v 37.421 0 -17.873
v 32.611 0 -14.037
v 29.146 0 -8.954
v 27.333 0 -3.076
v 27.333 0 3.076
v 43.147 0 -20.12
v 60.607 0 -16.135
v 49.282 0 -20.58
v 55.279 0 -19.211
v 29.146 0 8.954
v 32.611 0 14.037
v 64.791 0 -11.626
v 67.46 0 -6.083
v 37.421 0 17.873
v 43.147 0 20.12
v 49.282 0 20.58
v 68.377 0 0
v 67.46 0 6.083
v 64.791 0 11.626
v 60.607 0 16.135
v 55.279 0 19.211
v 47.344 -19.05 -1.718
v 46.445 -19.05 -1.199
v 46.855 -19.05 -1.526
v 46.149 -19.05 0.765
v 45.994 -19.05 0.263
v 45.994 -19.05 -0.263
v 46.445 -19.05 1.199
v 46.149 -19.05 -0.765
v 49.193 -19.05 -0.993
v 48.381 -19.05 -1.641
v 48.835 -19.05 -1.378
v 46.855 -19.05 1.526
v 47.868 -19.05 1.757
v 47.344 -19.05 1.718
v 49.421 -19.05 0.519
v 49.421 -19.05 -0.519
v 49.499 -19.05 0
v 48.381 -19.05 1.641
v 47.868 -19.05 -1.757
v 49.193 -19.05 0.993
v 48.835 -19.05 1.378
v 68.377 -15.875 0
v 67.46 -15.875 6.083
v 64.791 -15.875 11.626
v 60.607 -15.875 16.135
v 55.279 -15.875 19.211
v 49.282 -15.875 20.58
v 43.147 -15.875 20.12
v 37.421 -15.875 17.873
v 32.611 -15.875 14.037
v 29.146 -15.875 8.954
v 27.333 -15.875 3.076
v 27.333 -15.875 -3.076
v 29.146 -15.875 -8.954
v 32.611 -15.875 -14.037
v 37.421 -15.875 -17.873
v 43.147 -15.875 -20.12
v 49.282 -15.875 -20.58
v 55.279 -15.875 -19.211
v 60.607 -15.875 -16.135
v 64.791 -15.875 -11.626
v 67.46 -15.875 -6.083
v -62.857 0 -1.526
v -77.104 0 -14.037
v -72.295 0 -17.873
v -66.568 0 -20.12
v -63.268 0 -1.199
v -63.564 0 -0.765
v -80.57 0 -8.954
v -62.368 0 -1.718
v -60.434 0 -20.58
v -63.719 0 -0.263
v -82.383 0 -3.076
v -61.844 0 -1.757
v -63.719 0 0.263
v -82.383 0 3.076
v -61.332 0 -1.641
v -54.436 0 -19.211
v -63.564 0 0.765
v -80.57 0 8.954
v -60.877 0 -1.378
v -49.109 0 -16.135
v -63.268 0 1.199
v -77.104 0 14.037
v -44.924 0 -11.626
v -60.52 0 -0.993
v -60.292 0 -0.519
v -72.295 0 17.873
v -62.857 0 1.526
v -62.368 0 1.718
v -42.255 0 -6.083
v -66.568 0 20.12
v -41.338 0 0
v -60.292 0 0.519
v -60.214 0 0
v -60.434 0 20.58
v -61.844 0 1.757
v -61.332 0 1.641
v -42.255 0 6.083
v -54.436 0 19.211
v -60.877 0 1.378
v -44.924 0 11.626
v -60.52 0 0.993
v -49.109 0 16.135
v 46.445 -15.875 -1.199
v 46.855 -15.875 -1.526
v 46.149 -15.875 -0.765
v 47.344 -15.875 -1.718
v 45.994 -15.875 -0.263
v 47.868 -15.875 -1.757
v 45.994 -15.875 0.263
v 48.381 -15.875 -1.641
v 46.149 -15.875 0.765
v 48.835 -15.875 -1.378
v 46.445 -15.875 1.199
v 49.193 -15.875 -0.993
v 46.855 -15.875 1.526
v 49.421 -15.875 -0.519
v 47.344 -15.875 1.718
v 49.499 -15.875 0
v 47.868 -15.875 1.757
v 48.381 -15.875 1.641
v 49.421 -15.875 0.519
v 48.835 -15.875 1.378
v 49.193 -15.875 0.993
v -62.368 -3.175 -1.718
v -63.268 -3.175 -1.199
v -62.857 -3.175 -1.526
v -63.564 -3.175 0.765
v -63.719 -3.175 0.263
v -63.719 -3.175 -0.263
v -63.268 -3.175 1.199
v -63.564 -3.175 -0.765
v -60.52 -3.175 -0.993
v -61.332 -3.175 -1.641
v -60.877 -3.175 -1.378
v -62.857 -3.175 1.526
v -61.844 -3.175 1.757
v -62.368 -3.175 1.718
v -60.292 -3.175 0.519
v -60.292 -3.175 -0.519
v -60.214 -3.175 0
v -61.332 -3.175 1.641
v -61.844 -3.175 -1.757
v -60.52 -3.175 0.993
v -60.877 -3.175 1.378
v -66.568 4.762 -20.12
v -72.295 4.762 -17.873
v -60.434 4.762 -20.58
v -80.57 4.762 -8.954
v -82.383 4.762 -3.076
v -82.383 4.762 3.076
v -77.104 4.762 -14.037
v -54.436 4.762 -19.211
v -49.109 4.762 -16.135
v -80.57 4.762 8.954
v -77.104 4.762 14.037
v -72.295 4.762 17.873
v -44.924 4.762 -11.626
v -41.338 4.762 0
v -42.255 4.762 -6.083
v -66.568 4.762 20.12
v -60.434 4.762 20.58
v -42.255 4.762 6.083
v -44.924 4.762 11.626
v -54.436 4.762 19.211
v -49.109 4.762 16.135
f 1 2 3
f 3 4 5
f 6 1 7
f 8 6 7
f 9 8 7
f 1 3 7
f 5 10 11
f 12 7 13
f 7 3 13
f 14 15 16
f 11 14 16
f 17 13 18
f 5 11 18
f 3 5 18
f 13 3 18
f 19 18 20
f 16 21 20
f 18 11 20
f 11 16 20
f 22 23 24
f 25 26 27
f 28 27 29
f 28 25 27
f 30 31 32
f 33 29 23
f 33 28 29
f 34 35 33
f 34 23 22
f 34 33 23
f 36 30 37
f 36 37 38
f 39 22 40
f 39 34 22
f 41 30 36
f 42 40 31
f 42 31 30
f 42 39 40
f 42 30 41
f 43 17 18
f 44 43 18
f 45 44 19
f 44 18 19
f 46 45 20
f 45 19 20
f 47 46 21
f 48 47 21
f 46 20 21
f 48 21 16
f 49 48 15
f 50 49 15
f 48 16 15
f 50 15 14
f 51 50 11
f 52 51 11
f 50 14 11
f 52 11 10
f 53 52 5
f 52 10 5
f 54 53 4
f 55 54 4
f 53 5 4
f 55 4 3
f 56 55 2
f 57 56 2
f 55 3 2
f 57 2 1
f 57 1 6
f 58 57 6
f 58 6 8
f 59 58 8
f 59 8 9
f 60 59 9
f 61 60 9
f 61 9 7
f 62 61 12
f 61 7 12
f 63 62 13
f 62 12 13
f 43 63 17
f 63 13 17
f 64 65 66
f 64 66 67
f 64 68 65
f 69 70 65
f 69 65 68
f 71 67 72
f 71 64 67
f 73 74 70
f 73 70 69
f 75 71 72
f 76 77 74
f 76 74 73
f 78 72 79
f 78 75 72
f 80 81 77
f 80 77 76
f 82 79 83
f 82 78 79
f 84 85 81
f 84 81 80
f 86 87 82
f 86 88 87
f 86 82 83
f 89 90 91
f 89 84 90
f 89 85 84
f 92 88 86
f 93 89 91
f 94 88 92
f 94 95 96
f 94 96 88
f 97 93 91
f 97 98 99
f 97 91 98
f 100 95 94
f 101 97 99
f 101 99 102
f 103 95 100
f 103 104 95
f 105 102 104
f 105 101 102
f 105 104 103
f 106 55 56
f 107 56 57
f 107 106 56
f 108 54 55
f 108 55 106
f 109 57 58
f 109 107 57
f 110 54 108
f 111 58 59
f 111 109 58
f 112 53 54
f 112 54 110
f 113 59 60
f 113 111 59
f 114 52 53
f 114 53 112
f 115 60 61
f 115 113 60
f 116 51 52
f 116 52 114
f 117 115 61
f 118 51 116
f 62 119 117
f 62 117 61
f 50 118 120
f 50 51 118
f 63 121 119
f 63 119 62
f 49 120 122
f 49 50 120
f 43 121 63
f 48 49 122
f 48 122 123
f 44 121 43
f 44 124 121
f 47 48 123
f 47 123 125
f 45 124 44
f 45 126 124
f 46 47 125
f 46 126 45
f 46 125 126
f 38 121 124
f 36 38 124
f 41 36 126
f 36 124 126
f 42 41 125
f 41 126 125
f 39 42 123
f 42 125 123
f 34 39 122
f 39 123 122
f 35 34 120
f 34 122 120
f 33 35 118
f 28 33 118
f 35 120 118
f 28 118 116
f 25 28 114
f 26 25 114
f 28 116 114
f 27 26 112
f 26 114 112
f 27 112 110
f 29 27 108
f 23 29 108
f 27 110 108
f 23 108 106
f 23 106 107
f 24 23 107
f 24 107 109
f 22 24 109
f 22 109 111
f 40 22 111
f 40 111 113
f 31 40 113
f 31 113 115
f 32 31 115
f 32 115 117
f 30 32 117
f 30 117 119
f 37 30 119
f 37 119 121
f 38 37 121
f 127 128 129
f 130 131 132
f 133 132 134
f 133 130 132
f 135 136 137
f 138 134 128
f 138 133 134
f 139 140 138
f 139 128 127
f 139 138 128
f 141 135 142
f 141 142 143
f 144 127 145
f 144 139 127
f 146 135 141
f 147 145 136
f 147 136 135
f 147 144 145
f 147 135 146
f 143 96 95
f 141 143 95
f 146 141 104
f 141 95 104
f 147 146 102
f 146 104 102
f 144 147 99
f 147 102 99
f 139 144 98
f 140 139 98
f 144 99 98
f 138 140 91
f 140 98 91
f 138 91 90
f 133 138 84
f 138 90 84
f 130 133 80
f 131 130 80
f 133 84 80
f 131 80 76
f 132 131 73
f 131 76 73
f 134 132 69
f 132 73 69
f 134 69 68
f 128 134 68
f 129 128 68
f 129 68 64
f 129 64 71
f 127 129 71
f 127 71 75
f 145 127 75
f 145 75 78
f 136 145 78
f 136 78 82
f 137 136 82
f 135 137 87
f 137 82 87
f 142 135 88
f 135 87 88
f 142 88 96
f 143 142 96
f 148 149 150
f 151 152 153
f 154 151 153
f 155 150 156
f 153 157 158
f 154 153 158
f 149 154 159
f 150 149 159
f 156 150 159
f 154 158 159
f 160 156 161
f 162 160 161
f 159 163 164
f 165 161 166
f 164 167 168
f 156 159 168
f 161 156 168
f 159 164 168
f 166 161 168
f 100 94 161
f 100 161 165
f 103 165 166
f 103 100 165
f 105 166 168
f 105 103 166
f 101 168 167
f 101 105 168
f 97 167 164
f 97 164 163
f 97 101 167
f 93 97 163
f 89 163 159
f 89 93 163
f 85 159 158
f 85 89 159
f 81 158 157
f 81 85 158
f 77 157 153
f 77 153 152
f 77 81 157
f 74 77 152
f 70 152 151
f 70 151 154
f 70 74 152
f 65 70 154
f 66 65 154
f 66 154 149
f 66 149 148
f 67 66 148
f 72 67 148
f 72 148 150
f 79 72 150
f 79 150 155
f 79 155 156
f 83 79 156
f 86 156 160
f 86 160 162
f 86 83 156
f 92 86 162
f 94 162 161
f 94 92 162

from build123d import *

# Parameters (mm, degrees)
F0_R     = 20.6375
F1_DEPTH = 4.7625
F2_R     = 1.762382
F3_DEPTH = 3.175
F4_R     = 20.6375
F6_DEPTH = 15.875
F5_R     = 1.762382
F7_DEPTH = 19.05


with BuildPart() as f1:
    # F0 (on Front) → F1 (new body)
    with BuildSketch(Plane.XZ):
        with Locations((-61.976, 0)):
            Circle(F0_R)
    extrude(amount=-F1_DEPTH)

    # F2 (on face) → F3 (join)
    with BuildSketch(Plane.XZ):
        with Locations((-61.976, 0)):
            Circle(F2_R)
    extrude(amount=F3_DEPTH)


with BuildPart() as f6:
    # F4 (on Front) → F6 (new body)
    with BuildSketch(Plane.XZ):
        with Locations((47.739774, 0)):
            Circle(F4_R)
    extrude(amount=F6_DEPTH)

    # F5 (on Front) → F7 (join)
    with BuildSketch(Plane.XZ):
        with Locations((47.736637, 0)):
            Circle(F5_R)
    extrude(amount=F7_DEPTH)


solid = Compound([f1.part, f6.part])
